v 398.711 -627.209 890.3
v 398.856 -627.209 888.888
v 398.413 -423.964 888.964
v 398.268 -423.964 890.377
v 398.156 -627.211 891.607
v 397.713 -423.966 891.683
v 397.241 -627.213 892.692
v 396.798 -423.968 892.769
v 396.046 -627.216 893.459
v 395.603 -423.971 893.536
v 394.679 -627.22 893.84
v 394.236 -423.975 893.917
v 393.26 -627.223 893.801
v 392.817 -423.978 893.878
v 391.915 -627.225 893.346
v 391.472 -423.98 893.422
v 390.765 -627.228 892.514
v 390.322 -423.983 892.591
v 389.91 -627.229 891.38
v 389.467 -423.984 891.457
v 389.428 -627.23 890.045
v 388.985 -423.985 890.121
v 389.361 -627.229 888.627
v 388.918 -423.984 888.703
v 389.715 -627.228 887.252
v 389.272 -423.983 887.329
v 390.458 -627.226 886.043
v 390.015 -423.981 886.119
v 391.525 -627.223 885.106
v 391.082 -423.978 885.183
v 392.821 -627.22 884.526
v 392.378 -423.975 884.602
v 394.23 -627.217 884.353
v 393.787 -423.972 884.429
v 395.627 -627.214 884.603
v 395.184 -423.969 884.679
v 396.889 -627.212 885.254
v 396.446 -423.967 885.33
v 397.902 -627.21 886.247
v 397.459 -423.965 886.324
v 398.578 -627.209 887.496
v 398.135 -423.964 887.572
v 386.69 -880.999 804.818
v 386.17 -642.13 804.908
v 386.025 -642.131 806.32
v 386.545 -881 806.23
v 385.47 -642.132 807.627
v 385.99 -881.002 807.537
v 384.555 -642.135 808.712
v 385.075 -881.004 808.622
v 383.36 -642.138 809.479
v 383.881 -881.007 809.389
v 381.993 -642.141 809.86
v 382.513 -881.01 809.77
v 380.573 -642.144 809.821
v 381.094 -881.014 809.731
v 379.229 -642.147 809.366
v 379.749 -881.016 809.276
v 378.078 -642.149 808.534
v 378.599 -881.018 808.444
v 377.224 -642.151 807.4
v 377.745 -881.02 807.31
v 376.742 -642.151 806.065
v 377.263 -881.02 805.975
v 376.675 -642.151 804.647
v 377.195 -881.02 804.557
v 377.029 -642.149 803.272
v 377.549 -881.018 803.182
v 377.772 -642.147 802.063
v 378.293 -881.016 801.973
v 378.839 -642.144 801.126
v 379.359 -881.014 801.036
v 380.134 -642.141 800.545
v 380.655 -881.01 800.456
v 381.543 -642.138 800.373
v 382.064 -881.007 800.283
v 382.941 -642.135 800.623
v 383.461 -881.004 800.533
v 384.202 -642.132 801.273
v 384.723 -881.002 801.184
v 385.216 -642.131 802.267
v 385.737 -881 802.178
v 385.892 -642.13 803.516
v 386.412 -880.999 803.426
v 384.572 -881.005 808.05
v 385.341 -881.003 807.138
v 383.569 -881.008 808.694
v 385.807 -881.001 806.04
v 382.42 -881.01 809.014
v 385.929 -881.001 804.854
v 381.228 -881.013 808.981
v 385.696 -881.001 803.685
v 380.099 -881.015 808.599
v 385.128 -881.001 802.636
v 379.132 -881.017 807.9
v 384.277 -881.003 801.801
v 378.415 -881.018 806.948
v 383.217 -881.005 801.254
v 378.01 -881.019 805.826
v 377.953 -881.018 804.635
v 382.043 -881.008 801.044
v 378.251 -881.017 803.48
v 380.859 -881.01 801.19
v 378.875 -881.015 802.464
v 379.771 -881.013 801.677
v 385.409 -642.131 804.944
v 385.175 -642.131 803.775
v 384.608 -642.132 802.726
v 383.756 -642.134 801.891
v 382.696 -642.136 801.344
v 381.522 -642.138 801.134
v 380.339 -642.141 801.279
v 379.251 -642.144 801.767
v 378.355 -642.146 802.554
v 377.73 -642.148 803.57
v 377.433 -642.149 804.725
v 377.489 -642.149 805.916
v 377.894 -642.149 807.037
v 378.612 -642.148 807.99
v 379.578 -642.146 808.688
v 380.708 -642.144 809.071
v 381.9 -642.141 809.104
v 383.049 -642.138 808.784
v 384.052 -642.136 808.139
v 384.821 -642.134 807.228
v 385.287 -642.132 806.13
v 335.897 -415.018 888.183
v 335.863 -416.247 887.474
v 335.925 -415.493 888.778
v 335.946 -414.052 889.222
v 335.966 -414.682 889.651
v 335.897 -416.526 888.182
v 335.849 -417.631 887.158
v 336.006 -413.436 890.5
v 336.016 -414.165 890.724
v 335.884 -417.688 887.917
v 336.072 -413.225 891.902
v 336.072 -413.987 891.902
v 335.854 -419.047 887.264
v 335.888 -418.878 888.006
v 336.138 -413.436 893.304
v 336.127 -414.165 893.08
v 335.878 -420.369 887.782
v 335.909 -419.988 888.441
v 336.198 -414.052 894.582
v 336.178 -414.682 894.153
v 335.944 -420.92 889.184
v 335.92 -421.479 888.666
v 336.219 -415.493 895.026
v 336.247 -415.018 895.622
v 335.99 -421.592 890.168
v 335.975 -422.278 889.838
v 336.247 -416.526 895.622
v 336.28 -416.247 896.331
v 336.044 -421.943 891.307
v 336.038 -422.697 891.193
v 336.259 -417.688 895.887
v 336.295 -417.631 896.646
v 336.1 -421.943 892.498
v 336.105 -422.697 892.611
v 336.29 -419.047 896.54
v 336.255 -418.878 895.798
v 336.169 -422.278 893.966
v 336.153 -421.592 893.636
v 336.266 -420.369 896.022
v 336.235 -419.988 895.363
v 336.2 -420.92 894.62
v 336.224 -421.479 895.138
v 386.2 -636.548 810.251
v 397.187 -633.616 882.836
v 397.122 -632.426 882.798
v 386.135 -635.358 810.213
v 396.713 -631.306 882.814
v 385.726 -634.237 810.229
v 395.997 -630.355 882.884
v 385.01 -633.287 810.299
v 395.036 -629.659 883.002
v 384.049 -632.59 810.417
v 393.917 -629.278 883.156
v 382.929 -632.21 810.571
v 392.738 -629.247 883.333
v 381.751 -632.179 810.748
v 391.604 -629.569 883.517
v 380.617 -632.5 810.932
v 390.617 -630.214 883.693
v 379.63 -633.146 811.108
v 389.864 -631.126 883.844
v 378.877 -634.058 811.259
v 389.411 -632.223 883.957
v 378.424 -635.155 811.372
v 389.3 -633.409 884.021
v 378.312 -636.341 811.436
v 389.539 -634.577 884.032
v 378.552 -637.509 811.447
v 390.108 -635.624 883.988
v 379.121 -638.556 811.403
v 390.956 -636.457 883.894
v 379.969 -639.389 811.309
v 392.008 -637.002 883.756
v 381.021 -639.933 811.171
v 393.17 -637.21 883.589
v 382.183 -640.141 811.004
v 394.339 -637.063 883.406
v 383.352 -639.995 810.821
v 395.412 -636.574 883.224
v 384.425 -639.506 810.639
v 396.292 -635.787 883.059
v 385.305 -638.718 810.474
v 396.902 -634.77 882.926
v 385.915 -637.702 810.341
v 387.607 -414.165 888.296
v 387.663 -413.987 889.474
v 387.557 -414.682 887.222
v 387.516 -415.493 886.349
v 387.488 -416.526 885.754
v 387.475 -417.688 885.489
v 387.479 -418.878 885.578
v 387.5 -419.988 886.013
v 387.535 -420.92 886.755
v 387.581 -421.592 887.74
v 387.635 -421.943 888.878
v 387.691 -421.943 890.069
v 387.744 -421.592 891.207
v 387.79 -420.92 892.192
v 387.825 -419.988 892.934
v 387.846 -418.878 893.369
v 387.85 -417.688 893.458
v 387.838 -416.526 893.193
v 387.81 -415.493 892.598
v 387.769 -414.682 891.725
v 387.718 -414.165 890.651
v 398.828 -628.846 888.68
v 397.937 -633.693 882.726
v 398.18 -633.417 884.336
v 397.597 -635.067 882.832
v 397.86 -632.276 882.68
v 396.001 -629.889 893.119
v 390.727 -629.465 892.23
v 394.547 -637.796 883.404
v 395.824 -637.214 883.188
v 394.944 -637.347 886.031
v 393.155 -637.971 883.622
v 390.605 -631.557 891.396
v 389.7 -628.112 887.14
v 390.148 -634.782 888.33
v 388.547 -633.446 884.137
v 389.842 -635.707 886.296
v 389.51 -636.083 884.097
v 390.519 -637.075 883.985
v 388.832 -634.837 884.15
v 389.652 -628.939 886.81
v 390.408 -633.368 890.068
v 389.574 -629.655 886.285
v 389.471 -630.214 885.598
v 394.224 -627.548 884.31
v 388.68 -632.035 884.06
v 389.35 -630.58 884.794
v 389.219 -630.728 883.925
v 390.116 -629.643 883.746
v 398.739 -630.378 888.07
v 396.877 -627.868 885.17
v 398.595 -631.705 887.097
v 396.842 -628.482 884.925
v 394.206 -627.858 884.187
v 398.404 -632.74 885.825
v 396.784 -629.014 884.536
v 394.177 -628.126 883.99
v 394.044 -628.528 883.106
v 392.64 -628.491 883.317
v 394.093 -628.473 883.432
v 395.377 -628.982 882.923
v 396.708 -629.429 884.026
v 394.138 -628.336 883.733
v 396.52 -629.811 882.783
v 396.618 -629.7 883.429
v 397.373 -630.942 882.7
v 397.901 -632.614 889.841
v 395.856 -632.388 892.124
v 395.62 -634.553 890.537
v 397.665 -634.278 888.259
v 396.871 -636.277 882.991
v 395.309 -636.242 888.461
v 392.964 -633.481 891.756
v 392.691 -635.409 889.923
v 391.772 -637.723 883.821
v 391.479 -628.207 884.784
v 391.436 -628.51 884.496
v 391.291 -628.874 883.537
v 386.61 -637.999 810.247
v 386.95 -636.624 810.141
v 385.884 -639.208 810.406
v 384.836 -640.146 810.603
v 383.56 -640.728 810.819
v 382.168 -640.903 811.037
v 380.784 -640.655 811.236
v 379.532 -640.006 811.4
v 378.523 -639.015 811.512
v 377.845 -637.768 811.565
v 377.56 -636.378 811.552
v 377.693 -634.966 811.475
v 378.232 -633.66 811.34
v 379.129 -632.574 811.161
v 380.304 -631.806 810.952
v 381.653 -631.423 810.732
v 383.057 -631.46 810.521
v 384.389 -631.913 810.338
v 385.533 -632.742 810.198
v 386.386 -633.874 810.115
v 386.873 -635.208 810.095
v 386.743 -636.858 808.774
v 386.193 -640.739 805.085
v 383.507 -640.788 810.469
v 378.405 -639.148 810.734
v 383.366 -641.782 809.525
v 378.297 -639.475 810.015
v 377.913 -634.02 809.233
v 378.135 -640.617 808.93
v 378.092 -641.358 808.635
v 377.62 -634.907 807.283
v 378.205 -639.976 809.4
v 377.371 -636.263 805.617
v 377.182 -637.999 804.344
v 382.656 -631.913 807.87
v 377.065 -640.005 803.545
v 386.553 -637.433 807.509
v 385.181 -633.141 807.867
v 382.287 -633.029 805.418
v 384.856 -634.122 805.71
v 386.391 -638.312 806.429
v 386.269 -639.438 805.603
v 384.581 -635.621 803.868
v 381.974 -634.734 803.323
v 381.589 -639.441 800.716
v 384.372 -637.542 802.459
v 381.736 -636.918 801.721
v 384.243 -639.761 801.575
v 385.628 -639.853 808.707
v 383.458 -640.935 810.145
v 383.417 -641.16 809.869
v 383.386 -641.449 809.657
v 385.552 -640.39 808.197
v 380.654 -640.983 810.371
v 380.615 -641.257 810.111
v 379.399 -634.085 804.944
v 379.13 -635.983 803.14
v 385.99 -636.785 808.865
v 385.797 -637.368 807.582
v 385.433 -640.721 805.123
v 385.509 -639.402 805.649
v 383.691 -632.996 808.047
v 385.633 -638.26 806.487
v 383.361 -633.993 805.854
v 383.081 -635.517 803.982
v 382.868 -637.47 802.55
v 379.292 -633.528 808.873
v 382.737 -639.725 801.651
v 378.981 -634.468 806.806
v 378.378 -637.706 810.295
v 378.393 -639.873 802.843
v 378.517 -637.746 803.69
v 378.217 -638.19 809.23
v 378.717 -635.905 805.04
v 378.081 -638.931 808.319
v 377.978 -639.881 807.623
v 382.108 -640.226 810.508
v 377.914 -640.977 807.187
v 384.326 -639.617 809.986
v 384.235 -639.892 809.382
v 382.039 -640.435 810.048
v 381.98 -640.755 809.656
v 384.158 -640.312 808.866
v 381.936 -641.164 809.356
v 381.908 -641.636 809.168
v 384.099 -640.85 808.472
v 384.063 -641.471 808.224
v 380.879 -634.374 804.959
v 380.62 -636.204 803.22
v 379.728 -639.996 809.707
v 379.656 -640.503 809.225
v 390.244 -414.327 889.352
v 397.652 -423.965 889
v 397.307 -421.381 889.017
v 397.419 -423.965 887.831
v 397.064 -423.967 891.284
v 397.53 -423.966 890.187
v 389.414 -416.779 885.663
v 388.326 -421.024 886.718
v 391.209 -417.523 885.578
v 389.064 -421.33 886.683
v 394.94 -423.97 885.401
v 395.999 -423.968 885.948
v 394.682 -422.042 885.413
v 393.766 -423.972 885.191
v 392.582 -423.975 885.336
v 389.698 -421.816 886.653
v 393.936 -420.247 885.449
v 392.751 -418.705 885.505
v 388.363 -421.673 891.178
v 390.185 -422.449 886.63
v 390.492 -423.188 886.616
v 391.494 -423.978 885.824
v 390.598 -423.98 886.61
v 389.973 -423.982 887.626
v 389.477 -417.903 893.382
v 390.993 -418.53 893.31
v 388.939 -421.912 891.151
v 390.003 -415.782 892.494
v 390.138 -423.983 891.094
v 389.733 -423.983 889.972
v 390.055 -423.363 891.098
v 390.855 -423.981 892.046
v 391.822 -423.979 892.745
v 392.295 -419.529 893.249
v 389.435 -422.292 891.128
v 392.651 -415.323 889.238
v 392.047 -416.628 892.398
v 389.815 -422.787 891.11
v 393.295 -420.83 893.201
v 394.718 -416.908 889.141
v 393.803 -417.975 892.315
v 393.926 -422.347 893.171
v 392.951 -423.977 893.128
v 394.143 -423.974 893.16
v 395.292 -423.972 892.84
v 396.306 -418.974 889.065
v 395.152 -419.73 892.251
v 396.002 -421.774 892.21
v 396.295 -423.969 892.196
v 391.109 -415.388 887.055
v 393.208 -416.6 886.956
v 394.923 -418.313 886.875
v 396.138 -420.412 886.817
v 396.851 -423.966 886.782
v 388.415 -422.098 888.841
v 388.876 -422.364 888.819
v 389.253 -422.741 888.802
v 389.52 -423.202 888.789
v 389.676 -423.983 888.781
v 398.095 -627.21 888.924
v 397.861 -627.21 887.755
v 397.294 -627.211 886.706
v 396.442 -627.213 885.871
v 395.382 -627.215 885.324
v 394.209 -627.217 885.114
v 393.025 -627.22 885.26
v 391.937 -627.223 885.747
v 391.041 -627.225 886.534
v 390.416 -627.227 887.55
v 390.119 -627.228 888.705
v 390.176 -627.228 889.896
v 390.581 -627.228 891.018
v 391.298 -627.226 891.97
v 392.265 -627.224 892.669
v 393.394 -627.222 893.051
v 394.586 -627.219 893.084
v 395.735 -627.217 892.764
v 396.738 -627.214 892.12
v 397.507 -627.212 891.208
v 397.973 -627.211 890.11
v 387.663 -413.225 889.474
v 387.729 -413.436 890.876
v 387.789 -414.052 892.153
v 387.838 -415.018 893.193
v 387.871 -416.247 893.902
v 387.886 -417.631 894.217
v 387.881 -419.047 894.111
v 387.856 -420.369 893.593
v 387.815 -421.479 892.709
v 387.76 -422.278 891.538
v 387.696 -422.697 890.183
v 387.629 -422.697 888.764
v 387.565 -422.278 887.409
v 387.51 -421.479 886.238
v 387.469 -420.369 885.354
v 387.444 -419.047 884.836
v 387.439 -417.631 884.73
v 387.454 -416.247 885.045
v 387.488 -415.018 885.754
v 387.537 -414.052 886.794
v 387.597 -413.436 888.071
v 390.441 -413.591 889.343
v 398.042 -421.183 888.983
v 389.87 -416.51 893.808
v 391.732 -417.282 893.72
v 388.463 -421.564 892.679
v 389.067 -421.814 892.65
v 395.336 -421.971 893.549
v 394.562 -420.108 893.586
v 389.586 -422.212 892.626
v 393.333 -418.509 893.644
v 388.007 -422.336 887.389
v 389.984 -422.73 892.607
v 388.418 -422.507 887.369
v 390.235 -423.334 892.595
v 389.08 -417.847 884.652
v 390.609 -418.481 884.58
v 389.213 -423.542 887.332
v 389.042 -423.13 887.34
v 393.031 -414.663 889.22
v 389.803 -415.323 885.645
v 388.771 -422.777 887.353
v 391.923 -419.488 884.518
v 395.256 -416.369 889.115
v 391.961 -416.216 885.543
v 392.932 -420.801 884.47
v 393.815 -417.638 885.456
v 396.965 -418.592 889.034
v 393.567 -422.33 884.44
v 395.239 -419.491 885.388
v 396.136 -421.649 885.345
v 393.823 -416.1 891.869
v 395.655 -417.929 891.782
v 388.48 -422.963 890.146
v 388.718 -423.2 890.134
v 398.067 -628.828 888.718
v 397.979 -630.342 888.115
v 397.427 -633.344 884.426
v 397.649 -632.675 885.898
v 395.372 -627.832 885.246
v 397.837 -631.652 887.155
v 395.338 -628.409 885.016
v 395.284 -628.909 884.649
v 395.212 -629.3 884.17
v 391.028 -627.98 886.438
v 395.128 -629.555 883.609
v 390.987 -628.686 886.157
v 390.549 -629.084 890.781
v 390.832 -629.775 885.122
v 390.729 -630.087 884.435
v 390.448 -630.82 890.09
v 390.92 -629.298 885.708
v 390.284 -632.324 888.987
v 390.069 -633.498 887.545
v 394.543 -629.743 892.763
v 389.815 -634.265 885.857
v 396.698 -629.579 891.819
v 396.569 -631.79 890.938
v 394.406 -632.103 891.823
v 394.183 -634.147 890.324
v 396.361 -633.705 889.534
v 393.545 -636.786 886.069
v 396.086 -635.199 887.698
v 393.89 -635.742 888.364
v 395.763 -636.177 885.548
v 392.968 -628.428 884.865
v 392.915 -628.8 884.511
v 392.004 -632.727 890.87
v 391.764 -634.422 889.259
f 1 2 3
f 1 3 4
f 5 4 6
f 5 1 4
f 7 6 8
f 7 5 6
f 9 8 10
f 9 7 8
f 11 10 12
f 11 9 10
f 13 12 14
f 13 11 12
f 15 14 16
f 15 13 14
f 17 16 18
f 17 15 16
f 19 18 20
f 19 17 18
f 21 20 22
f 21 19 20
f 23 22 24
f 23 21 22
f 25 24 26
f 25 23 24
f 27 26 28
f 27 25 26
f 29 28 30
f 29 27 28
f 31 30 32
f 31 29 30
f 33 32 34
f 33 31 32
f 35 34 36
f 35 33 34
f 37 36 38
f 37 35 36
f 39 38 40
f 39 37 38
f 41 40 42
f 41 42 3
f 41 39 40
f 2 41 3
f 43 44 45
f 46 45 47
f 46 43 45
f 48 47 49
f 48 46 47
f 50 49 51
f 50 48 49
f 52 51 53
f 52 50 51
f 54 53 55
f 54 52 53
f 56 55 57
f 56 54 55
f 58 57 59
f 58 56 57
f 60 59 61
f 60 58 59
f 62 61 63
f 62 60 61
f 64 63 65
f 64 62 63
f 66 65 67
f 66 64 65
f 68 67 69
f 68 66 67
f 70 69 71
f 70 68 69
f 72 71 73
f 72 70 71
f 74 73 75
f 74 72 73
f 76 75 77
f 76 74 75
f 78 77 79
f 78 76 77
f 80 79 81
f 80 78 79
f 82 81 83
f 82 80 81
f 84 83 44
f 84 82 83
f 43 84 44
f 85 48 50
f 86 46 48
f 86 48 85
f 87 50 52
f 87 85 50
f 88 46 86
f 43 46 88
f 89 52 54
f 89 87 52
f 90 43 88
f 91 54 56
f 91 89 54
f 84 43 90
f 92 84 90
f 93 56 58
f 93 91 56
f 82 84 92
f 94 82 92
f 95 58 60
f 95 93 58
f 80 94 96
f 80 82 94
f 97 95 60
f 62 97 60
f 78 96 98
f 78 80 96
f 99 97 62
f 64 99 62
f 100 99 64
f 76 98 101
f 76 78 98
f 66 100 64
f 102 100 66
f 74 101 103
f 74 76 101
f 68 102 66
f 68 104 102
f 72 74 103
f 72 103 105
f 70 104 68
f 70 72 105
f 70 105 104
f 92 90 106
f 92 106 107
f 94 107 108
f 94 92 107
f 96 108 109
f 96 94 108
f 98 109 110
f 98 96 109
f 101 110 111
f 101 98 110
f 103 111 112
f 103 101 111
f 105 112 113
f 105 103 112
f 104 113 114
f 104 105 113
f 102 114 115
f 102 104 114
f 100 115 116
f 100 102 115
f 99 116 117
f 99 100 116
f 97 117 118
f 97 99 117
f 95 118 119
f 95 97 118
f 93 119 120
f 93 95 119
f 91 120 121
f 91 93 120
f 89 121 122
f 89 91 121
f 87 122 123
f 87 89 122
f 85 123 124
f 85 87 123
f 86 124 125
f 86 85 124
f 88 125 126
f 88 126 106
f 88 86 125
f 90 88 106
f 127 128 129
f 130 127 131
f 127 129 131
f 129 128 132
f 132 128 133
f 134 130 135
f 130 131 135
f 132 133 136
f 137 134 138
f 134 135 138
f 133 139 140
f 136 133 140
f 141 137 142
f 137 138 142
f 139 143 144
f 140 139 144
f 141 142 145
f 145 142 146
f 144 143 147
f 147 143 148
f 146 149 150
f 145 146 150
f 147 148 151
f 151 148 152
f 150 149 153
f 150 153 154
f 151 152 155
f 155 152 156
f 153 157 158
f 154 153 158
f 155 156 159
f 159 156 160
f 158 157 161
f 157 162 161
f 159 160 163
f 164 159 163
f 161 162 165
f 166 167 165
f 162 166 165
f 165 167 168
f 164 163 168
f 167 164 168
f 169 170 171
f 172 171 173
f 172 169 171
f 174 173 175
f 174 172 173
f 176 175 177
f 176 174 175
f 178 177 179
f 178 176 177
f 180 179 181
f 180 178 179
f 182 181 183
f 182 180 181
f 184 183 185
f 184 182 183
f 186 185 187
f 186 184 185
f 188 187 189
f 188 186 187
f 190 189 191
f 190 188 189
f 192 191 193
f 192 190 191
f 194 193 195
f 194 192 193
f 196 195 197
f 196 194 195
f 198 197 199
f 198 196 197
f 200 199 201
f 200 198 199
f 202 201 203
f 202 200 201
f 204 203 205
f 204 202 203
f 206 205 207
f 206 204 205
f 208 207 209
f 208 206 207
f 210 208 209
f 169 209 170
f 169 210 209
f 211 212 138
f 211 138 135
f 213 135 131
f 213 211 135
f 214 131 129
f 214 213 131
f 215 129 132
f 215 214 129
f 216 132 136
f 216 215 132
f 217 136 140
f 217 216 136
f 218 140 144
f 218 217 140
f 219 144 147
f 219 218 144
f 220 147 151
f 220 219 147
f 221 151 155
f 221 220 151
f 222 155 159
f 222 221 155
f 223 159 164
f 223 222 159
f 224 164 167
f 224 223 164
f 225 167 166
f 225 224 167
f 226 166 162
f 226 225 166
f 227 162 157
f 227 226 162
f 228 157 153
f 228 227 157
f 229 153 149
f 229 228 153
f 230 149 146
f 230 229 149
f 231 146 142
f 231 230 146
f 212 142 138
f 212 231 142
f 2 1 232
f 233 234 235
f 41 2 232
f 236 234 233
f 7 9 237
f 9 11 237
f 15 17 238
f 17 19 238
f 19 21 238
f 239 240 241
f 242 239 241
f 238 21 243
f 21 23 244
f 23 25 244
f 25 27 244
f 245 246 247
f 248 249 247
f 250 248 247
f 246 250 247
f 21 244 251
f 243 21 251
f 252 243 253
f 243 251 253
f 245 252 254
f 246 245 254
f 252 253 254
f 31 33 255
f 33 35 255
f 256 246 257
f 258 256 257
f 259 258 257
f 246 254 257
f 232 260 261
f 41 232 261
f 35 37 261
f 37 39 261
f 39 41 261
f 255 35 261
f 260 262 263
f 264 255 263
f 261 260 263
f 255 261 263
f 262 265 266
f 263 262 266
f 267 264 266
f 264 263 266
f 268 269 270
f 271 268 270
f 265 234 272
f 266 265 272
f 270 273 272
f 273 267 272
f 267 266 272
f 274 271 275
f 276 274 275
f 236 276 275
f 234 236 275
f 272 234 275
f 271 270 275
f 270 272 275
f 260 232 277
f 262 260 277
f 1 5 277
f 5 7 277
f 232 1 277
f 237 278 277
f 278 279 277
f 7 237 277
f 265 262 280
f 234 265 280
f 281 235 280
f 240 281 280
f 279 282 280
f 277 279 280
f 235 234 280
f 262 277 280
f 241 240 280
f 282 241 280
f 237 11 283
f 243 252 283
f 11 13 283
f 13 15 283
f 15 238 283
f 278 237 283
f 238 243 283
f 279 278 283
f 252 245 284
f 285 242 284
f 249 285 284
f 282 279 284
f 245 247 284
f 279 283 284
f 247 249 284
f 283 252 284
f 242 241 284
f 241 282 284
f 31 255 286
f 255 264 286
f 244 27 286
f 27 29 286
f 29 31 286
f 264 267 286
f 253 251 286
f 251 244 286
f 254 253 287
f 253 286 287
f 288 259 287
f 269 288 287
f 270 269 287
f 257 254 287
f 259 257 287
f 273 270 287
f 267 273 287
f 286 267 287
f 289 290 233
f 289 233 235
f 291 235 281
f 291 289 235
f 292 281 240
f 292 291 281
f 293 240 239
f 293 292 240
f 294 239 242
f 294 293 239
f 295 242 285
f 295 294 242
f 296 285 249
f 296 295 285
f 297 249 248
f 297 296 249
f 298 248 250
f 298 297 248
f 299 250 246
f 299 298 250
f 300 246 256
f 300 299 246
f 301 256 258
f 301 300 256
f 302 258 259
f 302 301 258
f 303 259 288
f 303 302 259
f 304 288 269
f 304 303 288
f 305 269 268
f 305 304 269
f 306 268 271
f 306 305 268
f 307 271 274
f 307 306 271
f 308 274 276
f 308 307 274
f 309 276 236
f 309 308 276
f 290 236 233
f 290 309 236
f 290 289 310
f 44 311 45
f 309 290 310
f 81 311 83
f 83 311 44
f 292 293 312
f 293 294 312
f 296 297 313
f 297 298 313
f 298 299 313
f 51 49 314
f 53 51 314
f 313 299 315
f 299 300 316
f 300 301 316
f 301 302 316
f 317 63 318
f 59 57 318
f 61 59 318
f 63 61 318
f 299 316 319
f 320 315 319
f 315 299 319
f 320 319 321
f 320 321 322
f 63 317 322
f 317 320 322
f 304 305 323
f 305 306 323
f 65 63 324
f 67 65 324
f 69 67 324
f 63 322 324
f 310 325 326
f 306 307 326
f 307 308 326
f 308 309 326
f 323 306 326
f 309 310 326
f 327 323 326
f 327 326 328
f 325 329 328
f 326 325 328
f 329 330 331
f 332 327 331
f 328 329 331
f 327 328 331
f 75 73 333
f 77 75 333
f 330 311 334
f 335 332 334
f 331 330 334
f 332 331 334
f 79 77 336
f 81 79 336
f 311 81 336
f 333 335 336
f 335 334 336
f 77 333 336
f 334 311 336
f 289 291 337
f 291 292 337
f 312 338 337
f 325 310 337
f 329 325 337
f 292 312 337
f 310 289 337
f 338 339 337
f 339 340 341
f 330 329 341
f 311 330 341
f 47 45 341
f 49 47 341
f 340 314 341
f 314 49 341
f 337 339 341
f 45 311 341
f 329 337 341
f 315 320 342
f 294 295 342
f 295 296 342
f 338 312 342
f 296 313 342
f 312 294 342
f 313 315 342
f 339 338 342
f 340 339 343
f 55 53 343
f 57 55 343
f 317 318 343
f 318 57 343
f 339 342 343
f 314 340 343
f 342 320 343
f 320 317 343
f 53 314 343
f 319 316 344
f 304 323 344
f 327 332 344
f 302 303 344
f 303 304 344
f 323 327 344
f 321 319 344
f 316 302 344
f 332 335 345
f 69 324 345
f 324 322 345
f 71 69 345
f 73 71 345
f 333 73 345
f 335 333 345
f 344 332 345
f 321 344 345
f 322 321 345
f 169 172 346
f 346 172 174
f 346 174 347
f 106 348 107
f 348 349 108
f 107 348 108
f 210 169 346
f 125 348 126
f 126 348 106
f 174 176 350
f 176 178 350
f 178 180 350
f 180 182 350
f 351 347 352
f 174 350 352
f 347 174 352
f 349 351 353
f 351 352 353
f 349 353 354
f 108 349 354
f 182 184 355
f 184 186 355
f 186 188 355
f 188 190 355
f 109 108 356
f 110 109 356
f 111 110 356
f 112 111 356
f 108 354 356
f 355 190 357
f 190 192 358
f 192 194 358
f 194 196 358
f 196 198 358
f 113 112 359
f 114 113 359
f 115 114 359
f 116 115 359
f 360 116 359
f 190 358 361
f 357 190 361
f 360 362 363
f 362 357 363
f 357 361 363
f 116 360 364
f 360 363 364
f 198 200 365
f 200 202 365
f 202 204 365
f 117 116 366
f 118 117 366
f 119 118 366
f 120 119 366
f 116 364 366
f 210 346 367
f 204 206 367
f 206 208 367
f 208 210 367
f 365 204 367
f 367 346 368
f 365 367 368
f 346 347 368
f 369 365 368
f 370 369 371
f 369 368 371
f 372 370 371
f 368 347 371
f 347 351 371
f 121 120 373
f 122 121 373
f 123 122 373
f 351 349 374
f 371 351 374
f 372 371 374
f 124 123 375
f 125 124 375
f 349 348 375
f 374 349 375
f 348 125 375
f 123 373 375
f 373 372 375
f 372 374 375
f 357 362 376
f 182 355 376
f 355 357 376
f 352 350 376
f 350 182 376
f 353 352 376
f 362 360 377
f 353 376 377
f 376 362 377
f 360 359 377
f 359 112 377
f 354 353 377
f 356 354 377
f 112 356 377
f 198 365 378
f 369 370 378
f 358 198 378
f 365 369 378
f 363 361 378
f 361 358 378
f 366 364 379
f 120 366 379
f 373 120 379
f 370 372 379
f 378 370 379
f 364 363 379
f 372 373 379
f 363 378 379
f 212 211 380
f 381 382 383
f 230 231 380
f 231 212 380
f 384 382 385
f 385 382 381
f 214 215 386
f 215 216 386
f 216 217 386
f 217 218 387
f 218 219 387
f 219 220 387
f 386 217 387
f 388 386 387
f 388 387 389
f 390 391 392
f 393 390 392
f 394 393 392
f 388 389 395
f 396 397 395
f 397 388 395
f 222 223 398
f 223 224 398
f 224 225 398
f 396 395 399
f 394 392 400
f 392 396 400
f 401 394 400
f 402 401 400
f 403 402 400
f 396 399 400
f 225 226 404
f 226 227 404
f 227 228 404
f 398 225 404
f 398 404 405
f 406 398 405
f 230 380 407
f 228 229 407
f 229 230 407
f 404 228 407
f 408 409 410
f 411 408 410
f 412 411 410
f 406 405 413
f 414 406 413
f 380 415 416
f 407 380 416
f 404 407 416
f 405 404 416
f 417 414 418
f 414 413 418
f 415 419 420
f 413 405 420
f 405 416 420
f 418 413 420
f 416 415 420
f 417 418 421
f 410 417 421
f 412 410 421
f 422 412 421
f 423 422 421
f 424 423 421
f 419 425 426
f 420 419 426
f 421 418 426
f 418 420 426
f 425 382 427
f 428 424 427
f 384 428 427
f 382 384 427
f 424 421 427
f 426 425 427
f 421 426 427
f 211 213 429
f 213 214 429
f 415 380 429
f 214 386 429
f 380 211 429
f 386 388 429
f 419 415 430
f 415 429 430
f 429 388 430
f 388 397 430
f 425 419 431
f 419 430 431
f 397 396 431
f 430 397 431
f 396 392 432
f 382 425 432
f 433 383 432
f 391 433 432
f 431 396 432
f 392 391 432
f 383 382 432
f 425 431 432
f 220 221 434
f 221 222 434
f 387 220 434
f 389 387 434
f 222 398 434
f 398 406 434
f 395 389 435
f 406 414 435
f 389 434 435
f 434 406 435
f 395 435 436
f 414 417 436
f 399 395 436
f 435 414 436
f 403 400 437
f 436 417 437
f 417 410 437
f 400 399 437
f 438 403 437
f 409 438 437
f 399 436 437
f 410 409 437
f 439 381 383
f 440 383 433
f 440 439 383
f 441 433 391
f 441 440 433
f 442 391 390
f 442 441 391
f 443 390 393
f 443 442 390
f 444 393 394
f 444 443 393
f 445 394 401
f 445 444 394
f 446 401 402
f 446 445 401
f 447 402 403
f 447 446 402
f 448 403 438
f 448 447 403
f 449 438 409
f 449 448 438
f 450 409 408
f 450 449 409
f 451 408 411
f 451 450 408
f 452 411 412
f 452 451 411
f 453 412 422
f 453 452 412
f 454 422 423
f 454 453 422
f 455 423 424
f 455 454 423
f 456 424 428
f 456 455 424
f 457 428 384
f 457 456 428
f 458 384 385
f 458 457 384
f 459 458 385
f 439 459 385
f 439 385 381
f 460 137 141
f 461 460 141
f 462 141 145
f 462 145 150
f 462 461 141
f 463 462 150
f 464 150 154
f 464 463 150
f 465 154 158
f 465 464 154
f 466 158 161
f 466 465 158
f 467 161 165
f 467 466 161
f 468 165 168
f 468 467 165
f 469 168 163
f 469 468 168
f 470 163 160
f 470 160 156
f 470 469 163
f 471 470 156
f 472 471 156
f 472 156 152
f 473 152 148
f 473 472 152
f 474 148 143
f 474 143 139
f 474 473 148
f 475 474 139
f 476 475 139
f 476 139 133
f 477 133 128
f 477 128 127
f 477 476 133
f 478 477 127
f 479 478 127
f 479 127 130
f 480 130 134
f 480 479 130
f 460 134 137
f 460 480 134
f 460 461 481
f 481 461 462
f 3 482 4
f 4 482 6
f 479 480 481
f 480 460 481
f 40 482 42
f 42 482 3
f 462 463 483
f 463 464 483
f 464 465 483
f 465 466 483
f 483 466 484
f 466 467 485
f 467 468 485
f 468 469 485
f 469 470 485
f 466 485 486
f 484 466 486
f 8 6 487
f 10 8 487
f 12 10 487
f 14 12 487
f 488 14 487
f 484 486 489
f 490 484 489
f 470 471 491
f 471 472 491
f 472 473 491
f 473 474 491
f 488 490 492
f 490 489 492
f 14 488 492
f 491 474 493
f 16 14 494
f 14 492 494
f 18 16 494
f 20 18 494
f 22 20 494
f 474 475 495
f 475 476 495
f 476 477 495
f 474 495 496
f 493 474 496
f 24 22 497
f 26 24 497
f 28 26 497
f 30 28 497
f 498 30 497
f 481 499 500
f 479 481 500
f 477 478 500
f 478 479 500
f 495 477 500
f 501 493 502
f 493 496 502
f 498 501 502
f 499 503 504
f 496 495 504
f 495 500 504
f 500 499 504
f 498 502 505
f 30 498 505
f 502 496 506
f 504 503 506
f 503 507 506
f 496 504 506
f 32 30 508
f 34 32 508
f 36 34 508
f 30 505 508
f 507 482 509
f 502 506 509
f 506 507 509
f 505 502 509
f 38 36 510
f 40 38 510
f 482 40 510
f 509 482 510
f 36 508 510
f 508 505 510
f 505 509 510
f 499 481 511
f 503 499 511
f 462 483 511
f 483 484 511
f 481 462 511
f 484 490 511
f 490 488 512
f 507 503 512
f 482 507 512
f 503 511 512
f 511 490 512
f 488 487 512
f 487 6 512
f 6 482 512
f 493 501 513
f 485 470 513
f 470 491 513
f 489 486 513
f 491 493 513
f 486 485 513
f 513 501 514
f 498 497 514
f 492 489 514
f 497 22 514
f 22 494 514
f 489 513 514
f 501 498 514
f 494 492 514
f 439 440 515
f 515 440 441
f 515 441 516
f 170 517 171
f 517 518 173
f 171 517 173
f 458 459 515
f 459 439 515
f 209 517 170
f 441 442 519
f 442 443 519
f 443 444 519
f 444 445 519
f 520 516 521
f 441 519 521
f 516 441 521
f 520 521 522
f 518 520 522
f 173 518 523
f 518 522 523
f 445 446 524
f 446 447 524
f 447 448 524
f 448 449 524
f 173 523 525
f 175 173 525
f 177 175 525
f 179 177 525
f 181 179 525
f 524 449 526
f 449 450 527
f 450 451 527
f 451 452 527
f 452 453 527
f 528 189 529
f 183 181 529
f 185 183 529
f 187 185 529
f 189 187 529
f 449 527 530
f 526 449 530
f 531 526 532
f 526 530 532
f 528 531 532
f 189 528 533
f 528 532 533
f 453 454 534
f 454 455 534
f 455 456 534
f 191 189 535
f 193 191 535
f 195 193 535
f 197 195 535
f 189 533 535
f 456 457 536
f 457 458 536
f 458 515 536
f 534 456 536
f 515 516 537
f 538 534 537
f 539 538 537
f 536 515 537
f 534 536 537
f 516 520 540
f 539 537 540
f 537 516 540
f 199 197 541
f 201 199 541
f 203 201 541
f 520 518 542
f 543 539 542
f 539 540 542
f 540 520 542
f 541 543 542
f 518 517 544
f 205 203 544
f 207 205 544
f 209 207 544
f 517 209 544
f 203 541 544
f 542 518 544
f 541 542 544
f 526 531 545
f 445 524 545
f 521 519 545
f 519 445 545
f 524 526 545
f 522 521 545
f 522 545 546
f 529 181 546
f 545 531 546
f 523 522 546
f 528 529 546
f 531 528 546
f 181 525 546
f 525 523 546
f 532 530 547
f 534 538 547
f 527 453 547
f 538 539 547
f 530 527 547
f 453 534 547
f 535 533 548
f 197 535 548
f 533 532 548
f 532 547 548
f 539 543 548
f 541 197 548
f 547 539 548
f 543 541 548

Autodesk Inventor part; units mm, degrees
ref_plane "YZ Plane" through (0, 0, 0) normal (1, 0, 0) x (0, 1, 0)
ref_plane "XZ Plane" through (0, 0, 0) normal (0, 1, 0) x (-1, 0, 0)
ref_plane "Work Plane5" through (336.0718, -417.9874, 891.9022) normal (0.9989, 0, -0.047) x (0, 1, 0)
sketch "Sketch7" plane through (336.0718, -417.9874, 891.9022) normal (0.9989, 0, -0.047) x (0, 1, 0)
  circle A0 centre (0, 0) radius 4.7625
  circle A1 centre (0, 0) radius 4.0005
sketch3d "3D Sketch5"
  line L0 (336.0718, -417.9874, 891.9022) -> (387.6626, -417.9874, 889.4735)
  arc A0 (387.6626, -417.9874, 889.4735) -> (393.6558, -423.9741, 889.1897) centre (387.6625, -423.9873, 889.4718) ccw
  line L1 (393.6558, -423.9741, 889.1897) -> (394.0987, -627.2191, 889.1133)
  arc A1 (394.0987, -627.2191, 889.1133) -> (393.2491, -633.2139, 883.4157) centre (393.2002, -627.2188, 883.181) ccw
  line L2 (393.2491, -633.2139, 883.4157) -> (382.262, -636.1455, 810.8307)
  arc A2 (382.262, -636.1455, 810.8307) -> (381.4125, -642.1403, 805.1332) centre (382.311, -642.1406, 811.0655) ccw
  line L3 (381.4125, -642.1403, 805.1332) -> (381.933, -881.0096, 805.0434)
  dimension "d24" = 5.9999
  dimension "d25" = 5.9999
  dimension "d26" = 5.9999
sweep "Sweep5" add profiles "Sketch7" path "3D Sketch5"
equation "\"OD\" = 9.525"
equation "\"t\" = 0.762"
equation "\"L\" = PL"
equation "\"ID\" = 8.001"
equation "\"PL\" = 595.0204"
equation "\"Size_Designation\" = 1.2345"
properties material "Copper"
